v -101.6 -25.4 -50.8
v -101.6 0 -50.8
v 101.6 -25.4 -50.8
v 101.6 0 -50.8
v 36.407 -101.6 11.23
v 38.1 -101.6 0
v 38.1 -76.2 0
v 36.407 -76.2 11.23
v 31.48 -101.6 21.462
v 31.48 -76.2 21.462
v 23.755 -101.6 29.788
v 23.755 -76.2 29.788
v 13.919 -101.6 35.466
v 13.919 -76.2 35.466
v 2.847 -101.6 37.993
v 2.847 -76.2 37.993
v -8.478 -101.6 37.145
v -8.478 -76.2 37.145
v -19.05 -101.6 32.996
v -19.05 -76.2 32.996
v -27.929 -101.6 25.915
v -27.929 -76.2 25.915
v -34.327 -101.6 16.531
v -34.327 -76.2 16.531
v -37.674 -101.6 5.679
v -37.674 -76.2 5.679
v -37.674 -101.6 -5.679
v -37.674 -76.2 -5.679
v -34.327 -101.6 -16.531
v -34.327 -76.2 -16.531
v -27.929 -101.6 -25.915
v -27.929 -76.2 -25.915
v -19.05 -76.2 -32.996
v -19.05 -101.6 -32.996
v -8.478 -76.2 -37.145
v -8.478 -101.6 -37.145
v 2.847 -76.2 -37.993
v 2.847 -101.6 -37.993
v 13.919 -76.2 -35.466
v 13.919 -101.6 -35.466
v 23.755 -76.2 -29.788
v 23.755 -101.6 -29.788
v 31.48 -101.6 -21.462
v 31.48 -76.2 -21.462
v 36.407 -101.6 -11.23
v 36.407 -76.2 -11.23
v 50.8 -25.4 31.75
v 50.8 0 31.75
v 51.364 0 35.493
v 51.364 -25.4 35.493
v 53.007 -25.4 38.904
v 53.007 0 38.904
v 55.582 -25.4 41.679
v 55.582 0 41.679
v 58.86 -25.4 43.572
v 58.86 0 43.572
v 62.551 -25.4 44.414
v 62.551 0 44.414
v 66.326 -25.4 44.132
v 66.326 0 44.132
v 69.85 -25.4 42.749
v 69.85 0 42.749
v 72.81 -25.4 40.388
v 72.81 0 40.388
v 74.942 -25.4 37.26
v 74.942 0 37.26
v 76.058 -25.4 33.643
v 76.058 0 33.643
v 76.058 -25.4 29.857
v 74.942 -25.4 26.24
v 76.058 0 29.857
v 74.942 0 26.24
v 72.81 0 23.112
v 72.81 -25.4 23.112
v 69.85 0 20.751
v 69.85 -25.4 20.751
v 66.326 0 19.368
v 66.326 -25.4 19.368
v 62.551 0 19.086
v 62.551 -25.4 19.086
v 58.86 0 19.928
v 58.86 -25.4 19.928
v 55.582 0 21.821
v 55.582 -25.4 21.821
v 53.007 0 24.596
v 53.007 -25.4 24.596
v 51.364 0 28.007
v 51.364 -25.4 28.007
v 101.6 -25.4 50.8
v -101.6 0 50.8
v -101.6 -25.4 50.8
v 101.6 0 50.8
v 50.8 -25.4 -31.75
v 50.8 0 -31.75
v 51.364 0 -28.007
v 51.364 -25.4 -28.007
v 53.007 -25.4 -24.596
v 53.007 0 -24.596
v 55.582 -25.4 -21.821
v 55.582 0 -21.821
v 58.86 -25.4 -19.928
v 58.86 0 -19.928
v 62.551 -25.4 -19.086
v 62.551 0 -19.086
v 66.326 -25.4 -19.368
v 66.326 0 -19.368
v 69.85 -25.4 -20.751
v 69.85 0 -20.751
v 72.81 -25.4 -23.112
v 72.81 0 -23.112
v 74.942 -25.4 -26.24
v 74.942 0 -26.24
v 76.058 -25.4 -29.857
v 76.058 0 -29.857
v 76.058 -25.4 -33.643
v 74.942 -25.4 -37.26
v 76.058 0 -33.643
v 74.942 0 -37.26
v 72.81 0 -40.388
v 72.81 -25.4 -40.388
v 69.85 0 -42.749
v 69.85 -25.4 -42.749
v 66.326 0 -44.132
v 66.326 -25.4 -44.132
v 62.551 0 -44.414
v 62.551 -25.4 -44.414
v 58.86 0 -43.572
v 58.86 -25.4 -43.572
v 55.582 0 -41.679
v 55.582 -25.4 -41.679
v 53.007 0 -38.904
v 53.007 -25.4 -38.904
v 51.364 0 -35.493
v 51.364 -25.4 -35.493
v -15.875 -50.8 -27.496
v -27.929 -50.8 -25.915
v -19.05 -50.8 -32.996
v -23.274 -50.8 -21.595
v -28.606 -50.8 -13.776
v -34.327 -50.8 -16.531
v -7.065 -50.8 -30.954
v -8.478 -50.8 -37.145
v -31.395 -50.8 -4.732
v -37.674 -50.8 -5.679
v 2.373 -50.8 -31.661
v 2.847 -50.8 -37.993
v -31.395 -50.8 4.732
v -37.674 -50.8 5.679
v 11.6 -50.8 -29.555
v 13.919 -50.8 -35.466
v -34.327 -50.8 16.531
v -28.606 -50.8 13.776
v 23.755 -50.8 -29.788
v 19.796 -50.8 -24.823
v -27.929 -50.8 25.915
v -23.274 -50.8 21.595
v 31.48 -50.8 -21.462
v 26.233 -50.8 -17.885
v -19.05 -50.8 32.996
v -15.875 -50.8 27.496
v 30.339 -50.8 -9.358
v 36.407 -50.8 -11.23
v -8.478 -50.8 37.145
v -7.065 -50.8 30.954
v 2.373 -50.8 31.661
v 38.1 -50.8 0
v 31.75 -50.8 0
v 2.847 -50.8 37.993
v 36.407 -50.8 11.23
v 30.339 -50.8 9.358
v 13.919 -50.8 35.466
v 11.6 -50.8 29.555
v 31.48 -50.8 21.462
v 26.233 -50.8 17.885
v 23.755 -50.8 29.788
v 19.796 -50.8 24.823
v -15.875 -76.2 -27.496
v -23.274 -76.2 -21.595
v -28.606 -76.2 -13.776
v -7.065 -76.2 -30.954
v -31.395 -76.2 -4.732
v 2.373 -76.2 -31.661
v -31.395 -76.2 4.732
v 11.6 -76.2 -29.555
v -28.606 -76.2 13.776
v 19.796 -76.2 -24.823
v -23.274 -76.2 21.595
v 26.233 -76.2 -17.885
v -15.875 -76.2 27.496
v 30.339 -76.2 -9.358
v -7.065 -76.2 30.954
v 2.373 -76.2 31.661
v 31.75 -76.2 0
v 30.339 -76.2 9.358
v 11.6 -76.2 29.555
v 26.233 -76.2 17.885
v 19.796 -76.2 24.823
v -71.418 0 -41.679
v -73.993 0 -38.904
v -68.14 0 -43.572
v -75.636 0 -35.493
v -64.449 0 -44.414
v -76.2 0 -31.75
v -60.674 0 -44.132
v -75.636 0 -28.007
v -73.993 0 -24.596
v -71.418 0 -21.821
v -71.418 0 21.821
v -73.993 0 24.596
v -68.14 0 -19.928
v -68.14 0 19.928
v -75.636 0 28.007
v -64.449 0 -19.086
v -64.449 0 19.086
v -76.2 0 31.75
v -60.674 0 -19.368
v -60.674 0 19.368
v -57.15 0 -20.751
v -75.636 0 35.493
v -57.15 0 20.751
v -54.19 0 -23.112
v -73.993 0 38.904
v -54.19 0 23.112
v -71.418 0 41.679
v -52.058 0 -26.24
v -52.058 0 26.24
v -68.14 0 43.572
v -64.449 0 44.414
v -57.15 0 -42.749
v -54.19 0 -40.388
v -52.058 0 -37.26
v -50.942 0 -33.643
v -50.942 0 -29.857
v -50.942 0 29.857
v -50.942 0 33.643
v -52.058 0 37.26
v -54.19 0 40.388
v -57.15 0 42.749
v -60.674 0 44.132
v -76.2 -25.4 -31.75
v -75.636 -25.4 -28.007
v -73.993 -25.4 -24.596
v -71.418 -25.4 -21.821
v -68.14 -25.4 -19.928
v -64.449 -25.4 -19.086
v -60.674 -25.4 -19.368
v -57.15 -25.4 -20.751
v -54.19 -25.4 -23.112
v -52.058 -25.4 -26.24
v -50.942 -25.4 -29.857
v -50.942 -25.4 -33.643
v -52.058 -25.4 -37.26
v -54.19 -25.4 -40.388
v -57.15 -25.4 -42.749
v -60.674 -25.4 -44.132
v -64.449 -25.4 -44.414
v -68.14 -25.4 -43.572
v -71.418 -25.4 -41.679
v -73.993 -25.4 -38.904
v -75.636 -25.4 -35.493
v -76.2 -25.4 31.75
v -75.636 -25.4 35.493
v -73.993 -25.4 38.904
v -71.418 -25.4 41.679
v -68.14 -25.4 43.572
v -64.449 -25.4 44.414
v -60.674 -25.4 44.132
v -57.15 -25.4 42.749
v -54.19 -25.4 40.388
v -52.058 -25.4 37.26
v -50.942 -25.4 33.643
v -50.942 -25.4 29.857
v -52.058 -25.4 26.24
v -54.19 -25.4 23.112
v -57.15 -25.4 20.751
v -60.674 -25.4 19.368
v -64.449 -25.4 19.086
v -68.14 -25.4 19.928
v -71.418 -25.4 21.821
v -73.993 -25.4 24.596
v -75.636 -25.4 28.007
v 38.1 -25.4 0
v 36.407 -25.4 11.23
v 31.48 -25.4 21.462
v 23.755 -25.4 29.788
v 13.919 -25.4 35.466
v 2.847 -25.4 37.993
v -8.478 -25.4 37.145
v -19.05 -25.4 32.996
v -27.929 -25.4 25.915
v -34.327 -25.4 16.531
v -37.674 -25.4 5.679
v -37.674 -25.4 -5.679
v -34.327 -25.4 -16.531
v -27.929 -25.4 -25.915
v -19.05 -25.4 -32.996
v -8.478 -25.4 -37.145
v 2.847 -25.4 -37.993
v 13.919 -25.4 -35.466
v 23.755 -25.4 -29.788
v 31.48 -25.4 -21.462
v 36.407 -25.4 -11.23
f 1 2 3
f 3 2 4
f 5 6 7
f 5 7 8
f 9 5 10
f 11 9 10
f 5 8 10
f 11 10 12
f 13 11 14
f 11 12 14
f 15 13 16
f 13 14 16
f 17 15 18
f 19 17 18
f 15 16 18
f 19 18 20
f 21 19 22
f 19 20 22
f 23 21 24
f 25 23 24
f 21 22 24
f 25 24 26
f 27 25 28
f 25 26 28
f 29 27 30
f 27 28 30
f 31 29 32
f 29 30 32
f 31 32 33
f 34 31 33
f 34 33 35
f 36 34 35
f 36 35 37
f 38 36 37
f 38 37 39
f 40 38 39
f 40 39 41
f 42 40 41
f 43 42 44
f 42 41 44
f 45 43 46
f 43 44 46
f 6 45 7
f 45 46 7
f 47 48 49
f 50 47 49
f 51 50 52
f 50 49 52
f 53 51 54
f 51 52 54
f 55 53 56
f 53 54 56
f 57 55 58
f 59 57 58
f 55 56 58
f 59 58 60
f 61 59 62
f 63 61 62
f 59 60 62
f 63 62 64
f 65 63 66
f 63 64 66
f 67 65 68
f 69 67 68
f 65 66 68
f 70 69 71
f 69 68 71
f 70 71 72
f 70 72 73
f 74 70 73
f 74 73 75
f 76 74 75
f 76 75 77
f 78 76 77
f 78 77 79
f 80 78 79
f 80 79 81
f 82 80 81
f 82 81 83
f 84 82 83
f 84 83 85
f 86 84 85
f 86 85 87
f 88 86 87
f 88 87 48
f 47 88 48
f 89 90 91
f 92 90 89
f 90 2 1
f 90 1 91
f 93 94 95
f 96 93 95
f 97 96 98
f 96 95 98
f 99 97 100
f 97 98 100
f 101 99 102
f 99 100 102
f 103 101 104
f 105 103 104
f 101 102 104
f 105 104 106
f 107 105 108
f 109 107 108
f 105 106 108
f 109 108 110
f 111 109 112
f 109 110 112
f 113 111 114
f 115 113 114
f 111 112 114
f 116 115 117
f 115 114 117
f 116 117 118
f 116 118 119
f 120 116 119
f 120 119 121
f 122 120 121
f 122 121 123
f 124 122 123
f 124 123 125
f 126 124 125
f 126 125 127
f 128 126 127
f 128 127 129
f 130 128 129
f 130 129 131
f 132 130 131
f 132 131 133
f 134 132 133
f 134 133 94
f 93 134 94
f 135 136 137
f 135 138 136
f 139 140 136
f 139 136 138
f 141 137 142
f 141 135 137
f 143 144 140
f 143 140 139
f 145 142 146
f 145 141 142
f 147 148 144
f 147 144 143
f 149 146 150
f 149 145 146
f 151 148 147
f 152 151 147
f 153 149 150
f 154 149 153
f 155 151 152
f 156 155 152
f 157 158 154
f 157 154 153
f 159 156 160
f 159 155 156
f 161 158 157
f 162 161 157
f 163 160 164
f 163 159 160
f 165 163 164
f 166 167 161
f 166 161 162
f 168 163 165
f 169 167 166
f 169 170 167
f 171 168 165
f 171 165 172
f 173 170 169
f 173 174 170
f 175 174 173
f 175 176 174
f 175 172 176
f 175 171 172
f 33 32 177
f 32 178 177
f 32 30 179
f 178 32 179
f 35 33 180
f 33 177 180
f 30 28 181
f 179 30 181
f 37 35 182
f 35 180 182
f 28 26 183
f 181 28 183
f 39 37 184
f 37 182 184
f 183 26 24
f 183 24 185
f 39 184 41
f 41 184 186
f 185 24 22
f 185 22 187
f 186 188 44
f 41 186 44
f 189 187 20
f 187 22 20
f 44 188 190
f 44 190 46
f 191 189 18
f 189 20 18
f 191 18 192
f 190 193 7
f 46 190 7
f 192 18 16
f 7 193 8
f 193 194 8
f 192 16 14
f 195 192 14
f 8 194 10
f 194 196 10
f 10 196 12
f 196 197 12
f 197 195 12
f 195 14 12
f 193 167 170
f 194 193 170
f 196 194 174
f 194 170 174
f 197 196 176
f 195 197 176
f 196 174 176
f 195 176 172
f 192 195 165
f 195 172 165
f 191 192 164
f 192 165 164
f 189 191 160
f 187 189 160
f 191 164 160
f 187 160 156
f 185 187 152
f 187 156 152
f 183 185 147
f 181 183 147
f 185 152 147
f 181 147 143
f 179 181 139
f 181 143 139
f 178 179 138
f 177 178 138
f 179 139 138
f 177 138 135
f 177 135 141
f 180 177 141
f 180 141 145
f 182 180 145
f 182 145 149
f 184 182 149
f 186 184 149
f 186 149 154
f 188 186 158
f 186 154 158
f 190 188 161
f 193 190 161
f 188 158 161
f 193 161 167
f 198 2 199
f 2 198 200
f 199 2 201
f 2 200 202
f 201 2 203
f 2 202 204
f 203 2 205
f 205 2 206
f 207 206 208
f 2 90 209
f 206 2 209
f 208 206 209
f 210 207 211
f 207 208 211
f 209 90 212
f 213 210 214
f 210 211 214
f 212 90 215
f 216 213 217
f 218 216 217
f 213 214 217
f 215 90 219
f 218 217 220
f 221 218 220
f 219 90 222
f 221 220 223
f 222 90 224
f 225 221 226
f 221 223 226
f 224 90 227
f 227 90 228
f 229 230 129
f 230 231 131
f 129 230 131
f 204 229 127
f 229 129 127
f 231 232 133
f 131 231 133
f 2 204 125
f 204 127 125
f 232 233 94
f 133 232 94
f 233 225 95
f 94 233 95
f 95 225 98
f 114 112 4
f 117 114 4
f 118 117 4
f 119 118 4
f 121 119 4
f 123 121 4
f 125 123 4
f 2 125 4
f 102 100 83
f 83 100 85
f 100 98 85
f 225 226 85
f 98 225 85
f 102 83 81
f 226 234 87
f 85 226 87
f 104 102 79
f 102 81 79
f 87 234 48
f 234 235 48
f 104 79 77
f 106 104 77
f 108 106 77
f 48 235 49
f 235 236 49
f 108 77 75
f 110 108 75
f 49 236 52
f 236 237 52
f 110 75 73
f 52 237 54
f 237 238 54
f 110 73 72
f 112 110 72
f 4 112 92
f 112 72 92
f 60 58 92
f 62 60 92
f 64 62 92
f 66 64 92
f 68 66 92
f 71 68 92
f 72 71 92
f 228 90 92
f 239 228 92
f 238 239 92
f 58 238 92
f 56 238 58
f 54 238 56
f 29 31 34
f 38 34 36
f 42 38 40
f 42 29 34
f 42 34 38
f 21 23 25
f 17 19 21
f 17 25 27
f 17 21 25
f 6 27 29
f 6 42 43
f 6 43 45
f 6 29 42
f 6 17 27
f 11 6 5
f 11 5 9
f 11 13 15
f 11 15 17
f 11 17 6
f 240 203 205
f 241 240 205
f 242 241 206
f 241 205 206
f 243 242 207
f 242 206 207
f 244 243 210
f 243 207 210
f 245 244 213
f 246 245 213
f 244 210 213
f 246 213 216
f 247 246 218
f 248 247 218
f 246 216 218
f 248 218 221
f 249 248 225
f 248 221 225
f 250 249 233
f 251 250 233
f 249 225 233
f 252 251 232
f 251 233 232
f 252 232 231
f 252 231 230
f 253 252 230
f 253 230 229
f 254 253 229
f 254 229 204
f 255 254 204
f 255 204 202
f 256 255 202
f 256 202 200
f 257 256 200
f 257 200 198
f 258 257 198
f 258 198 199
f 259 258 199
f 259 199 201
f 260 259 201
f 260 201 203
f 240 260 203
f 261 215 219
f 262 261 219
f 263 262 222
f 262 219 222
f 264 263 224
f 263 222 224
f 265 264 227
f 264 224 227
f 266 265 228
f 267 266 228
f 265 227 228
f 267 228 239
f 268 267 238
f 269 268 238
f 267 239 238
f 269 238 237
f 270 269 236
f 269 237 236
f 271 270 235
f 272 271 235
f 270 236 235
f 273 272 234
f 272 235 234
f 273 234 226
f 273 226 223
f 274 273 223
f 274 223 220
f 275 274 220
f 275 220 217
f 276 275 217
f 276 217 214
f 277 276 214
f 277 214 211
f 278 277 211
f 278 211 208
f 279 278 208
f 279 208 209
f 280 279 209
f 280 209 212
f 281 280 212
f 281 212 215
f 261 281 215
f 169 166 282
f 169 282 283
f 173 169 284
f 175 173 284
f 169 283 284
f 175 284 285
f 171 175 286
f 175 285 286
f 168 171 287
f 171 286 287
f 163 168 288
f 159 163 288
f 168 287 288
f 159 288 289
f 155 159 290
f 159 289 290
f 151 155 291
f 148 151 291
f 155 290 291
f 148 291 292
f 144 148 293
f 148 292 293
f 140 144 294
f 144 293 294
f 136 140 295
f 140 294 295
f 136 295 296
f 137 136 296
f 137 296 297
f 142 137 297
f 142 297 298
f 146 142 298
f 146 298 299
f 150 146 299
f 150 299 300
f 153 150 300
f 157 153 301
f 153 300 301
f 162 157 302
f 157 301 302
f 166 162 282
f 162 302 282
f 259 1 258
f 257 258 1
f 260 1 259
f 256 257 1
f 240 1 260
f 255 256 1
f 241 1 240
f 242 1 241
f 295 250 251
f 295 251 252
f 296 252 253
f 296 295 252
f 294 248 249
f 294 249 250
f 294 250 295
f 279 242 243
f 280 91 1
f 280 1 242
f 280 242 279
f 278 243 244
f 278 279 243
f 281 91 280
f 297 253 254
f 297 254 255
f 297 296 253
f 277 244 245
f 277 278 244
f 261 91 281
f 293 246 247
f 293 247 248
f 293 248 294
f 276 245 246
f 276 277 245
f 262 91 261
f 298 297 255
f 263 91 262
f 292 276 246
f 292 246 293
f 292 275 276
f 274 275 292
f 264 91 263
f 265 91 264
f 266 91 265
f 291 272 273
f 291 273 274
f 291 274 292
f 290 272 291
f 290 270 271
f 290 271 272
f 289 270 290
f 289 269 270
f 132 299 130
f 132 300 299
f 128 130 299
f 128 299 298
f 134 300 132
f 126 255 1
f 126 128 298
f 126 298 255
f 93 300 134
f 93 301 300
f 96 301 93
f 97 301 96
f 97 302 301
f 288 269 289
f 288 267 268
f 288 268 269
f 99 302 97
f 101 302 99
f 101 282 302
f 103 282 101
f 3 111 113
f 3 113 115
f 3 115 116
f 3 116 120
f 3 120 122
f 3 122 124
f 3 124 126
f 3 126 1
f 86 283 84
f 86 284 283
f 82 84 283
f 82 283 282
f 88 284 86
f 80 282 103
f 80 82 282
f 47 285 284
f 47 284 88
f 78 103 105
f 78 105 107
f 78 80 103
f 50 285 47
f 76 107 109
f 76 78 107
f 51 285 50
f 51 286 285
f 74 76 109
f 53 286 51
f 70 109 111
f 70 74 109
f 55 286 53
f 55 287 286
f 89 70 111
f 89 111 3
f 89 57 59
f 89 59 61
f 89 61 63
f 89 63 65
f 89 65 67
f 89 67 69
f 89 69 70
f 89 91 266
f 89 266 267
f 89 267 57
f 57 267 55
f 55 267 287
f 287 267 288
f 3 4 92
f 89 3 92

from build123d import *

# Parameters (mm, degrees)
F0_W     = 203.2
F0_H     = 101.6
F1_DEPTH = 25.4
F3_D     = 25.4
F4_R     = 38.1
F5_DEPTH = 25.4
F6_R     = 31.75
F7_DEPTH = 25.4
F8_R     = 38.1
F9_DEPTH = 25.4


with BuildPart() as f1:
    # F0 (on Front) → F1 (new body)
    with BuildSketch(Plane.XZ):
        Rectangle(F0_W, F0_H)
    extrude(amount=F1_DEPTH)

    # F3 (through all)
    with Locations(Plane.XZ.offset(25.4)):
        with Locations((-63.5, 31.75), (-63.5, -31.75), (63.5, -31.75), (63.5, 31.75)):
            Hole(F3_D / 2)



with BuildPart() as f5:
    # F4 (on face) → F5 (new body)
    with BuildSketch(Plane.XZ.offset(76.2)):
        Circle(F4_R)
    extrude(amount=F5_DEPTH)

    # F6 (on face) → F7 (join)
    with BuildSketch(Plane.XZ.offset(50.8)):
        Circle(F6_R)
    extrude(amount=F7_DEPTH)


with BuildPart() as f1_1:
    add(f1.part)

    add(f5.part)  # F9 merges F5
    # F8 (on face) → F9 (join)
    with BuildSketch(Plane.XZ.offset(25.4)):
        Circle(F8_R)
    extrude(amount=F9_DEPTH)


solid = f1_1.part
